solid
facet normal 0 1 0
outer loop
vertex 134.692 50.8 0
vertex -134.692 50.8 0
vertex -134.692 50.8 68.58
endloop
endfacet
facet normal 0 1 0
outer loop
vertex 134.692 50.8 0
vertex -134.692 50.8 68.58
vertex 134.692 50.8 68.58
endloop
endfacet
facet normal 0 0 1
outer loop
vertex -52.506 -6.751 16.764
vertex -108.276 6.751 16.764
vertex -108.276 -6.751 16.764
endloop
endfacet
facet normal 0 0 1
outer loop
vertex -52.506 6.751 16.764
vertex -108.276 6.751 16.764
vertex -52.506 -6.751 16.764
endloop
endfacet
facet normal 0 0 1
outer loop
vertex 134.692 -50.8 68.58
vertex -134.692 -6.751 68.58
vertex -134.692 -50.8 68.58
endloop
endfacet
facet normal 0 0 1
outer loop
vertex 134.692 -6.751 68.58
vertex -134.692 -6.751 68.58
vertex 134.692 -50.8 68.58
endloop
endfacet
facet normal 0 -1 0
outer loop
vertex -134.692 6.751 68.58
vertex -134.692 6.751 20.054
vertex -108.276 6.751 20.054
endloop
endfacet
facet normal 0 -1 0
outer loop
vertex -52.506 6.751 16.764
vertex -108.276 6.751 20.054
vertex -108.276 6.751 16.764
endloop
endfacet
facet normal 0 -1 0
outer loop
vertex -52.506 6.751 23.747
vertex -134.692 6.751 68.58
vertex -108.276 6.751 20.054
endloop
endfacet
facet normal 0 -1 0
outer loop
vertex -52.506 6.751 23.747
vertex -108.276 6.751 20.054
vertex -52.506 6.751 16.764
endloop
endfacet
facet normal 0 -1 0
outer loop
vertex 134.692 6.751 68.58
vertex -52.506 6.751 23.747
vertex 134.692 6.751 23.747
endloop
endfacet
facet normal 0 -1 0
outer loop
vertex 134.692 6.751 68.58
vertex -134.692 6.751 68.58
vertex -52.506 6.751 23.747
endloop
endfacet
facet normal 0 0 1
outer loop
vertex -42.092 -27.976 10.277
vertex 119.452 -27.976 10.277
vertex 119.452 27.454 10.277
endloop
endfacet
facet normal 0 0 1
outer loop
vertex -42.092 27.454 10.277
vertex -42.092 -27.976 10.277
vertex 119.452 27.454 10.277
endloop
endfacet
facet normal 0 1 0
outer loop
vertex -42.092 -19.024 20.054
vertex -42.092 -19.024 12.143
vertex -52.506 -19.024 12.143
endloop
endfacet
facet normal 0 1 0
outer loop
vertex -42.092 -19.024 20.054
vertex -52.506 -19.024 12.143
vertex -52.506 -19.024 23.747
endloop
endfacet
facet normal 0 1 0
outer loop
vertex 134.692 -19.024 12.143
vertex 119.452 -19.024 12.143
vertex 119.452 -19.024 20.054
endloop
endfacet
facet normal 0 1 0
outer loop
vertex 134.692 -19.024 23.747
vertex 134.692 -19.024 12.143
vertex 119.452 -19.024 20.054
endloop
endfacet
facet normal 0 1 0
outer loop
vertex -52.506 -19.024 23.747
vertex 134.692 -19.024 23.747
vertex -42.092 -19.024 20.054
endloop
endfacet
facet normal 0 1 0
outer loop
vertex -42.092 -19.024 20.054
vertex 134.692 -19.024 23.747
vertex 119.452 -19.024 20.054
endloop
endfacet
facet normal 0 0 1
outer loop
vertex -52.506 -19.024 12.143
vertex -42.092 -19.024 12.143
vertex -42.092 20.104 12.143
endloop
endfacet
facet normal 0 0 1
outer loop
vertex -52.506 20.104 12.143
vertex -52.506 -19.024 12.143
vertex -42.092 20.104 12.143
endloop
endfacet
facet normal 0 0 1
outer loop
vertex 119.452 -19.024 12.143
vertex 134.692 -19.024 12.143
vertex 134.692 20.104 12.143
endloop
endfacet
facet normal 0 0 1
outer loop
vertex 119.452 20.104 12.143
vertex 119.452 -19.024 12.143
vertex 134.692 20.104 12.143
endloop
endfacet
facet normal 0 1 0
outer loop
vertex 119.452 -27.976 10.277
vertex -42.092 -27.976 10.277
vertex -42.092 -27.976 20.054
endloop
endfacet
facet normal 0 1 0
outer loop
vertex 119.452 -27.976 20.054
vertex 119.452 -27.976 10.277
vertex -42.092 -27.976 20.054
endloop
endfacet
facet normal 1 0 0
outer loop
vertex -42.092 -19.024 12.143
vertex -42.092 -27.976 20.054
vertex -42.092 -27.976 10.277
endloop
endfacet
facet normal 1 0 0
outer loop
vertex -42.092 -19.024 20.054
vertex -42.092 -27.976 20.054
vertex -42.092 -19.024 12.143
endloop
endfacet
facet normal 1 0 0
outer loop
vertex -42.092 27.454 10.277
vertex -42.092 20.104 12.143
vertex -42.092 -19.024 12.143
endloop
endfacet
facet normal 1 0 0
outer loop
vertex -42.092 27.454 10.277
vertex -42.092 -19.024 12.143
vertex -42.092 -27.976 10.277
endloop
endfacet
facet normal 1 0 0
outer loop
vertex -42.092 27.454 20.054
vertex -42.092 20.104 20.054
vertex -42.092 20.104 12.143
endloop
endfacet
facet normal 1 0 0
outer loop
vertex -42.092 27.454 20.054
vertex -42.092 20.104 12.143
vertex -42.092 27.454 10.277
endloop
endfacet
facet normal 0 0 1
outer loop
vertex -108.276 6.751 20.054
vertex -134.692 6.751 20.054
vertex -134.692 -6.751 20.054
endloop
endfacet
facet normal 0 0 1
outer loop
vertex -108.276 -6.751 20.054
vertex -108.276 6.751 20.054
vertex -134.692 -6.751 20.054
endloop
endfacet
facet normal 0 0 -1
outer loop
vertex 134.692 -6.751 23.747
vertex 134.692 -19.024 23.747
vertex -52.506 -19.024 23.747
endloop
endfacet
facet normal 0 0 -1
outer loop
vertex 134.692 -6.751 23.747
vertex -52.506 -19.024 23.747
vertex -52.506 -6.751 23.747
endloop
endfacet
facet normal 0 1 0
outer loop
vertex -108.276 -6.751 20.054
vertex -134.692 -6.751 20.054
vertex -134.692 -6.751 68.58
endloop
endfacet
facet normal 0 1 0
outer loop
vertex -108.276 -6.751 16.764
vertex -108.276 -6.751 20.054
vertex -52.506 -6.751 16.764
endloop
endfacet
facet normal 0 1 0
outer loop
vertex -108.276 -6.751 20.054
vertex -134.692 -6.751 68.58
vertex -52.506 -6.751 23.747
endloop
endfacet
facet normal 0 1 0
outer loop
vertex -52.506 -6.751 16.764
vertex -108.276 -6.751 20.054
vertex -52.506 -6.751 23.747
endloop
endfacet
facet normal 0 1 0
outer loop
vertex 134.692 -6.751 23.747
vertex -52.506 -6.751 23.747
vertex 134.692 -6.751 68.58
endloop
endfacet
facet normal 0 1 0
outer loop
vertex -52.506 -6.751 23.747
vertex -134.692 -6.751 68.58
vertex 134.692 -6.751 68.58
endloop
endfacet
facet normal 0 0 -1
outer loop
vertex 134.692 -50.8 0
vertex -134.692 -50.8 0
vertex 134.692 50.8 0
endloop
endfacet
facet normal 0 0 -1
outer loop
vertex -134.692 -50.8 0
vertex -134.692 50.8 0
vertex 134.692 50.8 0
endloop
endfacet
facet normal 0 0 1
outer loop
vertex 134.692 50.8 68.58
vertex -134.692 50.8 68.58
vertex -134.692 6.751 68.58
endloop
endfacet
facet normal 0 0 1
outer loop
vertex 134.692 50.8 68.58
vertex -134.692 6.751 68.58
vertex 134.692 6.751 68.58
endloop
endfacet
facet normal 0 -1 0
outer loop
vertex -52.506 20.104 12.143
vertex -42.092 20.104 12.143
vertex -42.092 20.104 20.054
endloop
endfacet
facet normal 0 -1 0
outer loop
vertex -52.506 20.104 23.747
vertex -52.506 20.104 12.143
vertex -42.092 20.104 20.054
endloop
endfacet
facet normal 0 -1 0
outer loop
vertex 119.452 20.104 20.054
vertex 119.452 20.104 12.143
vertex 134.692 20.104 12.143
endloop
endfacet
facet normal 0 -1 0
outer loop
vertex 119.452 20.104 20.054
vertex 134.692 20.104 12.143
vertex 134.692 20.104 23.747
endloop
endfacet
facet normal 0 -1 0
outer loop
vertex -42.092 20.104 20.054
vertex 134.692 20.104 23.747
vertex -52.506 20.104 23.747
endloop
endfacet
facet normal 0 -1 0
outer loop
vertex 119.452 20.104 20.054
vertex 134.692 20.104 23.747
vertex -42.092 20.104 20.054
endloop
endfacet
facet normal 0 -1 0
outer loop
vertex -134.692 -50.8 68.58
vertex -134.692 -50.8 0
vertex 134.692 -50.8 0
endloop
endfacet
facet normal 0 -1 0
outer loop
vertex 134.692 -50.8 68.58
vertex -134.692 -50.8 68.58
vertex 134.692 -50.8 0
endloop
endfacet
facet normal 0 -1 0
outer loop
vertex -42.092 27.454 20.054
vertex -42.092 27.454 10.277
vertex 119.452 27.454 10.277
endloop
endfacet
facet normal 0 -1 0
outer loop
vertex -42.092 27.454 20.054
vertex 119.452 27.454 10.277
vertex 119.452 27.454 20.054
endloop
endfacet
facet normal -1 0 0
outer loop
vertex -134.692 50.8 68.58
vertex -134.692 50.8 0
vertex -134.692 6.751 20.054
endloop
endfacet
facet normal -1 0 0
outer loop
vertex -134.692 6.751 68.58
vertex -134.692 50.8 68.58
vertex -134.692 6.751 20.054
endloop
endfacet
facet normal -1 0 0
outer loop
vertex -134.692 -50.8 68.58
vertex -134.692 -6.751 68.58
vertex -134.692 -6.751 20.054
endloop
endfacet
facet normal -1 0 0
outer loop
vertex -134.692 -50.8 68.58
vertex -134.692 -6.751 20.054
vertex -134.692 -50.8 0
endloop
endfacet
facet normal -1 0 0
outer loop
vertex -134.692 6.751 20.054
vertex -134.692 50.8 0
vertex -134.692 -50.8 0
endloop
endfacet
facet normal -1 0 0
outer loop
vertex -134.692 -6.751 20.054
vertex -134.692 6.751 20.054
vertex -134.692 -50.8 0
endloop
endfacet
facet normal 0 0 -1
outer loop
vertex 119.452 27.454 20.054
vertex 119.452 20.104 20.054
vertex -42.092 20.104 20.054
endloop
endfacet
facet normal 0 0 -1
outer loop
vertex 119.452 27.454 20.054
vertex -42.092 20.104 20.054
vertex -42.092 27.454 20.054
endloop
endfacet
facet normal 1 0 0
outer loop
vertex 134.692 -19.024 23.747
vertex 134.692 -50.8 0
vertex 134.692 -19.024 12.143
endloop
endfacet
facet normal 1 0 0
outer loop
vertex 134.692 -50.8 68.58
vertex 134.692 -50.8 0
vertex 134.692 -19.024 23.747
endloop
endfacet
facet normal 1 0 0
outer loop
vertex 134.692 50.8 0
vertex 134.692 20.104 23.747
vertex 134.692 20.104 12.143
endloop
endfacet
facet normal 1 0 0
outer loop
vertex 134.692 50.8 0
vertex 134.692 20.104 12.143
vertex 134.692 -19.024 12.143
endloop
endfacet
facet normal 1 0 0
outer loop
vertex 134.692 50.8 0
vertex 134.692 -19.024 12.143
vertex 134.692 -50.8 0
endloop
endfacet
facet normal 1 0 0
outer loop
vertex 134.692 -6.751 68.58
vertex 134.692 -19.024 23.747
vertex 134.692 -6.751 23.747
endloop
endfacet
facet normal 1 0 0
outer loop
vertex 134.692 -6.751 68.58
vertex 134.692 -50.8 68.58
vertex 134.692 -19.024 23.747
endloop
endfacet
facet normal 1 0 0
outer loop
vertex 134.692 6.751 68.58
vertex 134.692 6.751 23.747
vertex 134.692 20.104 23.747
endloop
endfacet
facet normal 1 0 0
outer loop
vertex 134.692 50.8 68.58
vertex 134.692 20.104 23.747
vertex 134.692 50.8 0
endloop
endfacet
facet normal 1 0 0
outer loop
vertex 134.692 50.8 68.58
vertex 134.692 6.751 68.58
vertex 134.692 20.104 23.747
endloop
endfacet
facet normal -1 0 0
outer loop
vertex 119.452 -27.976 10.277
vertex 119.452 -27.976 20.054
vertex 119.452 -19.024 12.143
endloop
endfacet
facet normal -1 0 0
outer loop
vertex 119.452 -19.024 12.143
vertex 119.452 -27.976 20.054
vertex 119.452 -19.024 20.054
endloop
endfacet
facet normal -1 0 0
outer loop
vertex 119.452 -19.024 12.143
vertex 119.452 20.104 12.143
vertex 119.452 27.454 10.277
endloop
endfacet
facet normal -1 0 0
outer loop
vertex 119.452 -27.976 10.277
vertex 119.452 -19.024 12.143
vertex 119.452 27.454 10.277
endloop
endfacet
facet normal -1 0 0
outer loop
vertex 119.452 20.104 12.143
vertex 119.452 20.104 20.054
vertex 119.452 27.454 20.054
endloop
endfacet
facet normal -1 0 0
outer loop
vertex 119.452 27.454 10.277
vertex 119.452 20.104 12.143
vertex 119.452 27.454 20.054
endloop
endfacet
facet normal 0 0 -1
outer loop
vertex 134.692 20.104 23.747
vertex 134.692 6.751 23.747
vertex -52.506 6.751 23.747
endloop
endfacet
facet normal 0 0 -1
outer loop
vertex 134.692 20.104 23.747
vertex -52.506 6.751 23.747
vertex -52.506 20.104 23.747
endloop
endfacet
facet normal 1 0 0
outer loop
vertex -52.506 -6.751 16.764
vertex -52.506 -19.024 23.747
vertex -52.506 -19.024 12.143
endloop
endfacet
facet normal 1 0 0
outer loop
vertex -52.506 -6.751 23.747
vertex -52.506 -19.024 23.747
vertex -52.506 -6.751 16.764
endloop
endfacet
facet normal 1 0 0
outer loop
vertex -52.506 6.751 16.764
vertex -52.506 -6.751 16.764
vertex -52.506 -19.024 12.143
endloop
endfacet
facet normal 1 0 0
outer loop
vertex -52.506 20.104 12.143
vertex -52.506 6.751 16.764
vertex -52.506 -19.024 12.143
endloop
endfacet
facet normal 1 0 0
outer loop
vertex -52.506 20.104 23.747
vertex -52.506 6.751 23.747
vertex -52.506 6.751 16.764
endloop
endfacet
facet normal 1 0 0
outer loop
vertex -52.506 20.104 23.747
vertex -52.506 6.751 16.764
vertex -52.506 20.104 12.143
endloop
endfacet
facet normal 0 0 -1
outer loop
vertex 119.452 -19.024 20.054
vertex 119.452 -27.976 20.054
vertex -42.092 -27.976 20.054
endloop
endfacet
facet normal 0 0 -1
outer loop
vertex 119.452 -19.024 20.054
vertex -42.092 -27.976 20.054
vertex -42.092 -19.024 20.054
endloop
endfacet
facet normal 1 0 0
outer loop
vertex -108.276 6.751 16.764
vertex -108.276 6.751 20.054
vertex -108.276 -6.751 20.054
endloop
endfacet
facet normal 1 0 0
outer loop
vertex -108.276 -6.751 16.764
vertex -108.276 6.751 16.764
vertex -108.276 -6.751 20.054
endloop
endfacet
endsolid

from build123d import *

# Parameters (mm, degrees)
F0_W      = 269.38311
F0_H      = 16.098589
F0_H_2    = 69.402822
F1_DEPTH  = 68.58
F2_W      = 269.38311
F2_H      = 13.501506
F3_DEPTH  = 51.816
F4_W      = 55.430394
F4_H      = 9.777048
F5_DEPTH  = 176.784
F6_DEPTH  = 15.24
F7_W      = 55.430394
F7_H      = 9.777048
F8_DEPTH  = 26.416
F9_W      = 39.127992
F9_H      = 11.603475
F10_DEPTH = 187.198


with BuildPart() as f1:
    # F0 (on Top) → F1 (new body)
    with BuildSketch(Plane.XY):
        with Locations((0, 42.750705)):
            Rectangle(F0_W, F0_H)
        Rectangle(F0_W, F0_H_2)
        with Locations((0, -42.750705)):
            Rectangle(F0_W, F0_H)
    extrude(amount=F1_DEPTH)

    # F2 (on face) → F3 (cut)
    with BuildSketch(Plane.XY.offset(68.58)):
        Rectangle(F2_W, F2_H)
    extrude(amount=-F3_DEPTH, mode=Mode.SUBTRACT)

    # F4 (on face) → F5 (cut)
    with BuildSketch(Plane.YZ.offset(134.691555)):
        with Locations((-0.261033, 15.165092)):
            Rectangle(F4_W, F4_H)
    extrude(amount=-F5_DEPTH, mode=Mode.SUBTRACT)

    # F4 (on face) → F6 (join)
    with BuildSketch(Plane.YZ.offset(134.691555)):
        with Locations((-0.261033, 15.165092)):
            Rectangle(F4_W, F4_H)
    extrude(amount=-F6_DEPTH)

    # F7 (on face) → F8 (join)
    with BuildSketch(Plane(origin=(-134.691555, 0, 0), x_dir=(0, -1, 0), z_dir=(-1, 0, 0))):
        with Locations((20.964444, 15.165092)):
            Rectangle(F7_W, F7_H)
    extrude(amount=-F8_DEPTH)

    # F9 (on face) → F10 (cut)
    with BuildSketch(Plane.YZ.offset(134.691555)):
        with Locations((0.539697, 17.944907)):
            Rectangle(F9_W, F9_H)
    extrude(amount=-F10_DEPTH, mode=Mode.SUBTRACT)


solid = f1.part
